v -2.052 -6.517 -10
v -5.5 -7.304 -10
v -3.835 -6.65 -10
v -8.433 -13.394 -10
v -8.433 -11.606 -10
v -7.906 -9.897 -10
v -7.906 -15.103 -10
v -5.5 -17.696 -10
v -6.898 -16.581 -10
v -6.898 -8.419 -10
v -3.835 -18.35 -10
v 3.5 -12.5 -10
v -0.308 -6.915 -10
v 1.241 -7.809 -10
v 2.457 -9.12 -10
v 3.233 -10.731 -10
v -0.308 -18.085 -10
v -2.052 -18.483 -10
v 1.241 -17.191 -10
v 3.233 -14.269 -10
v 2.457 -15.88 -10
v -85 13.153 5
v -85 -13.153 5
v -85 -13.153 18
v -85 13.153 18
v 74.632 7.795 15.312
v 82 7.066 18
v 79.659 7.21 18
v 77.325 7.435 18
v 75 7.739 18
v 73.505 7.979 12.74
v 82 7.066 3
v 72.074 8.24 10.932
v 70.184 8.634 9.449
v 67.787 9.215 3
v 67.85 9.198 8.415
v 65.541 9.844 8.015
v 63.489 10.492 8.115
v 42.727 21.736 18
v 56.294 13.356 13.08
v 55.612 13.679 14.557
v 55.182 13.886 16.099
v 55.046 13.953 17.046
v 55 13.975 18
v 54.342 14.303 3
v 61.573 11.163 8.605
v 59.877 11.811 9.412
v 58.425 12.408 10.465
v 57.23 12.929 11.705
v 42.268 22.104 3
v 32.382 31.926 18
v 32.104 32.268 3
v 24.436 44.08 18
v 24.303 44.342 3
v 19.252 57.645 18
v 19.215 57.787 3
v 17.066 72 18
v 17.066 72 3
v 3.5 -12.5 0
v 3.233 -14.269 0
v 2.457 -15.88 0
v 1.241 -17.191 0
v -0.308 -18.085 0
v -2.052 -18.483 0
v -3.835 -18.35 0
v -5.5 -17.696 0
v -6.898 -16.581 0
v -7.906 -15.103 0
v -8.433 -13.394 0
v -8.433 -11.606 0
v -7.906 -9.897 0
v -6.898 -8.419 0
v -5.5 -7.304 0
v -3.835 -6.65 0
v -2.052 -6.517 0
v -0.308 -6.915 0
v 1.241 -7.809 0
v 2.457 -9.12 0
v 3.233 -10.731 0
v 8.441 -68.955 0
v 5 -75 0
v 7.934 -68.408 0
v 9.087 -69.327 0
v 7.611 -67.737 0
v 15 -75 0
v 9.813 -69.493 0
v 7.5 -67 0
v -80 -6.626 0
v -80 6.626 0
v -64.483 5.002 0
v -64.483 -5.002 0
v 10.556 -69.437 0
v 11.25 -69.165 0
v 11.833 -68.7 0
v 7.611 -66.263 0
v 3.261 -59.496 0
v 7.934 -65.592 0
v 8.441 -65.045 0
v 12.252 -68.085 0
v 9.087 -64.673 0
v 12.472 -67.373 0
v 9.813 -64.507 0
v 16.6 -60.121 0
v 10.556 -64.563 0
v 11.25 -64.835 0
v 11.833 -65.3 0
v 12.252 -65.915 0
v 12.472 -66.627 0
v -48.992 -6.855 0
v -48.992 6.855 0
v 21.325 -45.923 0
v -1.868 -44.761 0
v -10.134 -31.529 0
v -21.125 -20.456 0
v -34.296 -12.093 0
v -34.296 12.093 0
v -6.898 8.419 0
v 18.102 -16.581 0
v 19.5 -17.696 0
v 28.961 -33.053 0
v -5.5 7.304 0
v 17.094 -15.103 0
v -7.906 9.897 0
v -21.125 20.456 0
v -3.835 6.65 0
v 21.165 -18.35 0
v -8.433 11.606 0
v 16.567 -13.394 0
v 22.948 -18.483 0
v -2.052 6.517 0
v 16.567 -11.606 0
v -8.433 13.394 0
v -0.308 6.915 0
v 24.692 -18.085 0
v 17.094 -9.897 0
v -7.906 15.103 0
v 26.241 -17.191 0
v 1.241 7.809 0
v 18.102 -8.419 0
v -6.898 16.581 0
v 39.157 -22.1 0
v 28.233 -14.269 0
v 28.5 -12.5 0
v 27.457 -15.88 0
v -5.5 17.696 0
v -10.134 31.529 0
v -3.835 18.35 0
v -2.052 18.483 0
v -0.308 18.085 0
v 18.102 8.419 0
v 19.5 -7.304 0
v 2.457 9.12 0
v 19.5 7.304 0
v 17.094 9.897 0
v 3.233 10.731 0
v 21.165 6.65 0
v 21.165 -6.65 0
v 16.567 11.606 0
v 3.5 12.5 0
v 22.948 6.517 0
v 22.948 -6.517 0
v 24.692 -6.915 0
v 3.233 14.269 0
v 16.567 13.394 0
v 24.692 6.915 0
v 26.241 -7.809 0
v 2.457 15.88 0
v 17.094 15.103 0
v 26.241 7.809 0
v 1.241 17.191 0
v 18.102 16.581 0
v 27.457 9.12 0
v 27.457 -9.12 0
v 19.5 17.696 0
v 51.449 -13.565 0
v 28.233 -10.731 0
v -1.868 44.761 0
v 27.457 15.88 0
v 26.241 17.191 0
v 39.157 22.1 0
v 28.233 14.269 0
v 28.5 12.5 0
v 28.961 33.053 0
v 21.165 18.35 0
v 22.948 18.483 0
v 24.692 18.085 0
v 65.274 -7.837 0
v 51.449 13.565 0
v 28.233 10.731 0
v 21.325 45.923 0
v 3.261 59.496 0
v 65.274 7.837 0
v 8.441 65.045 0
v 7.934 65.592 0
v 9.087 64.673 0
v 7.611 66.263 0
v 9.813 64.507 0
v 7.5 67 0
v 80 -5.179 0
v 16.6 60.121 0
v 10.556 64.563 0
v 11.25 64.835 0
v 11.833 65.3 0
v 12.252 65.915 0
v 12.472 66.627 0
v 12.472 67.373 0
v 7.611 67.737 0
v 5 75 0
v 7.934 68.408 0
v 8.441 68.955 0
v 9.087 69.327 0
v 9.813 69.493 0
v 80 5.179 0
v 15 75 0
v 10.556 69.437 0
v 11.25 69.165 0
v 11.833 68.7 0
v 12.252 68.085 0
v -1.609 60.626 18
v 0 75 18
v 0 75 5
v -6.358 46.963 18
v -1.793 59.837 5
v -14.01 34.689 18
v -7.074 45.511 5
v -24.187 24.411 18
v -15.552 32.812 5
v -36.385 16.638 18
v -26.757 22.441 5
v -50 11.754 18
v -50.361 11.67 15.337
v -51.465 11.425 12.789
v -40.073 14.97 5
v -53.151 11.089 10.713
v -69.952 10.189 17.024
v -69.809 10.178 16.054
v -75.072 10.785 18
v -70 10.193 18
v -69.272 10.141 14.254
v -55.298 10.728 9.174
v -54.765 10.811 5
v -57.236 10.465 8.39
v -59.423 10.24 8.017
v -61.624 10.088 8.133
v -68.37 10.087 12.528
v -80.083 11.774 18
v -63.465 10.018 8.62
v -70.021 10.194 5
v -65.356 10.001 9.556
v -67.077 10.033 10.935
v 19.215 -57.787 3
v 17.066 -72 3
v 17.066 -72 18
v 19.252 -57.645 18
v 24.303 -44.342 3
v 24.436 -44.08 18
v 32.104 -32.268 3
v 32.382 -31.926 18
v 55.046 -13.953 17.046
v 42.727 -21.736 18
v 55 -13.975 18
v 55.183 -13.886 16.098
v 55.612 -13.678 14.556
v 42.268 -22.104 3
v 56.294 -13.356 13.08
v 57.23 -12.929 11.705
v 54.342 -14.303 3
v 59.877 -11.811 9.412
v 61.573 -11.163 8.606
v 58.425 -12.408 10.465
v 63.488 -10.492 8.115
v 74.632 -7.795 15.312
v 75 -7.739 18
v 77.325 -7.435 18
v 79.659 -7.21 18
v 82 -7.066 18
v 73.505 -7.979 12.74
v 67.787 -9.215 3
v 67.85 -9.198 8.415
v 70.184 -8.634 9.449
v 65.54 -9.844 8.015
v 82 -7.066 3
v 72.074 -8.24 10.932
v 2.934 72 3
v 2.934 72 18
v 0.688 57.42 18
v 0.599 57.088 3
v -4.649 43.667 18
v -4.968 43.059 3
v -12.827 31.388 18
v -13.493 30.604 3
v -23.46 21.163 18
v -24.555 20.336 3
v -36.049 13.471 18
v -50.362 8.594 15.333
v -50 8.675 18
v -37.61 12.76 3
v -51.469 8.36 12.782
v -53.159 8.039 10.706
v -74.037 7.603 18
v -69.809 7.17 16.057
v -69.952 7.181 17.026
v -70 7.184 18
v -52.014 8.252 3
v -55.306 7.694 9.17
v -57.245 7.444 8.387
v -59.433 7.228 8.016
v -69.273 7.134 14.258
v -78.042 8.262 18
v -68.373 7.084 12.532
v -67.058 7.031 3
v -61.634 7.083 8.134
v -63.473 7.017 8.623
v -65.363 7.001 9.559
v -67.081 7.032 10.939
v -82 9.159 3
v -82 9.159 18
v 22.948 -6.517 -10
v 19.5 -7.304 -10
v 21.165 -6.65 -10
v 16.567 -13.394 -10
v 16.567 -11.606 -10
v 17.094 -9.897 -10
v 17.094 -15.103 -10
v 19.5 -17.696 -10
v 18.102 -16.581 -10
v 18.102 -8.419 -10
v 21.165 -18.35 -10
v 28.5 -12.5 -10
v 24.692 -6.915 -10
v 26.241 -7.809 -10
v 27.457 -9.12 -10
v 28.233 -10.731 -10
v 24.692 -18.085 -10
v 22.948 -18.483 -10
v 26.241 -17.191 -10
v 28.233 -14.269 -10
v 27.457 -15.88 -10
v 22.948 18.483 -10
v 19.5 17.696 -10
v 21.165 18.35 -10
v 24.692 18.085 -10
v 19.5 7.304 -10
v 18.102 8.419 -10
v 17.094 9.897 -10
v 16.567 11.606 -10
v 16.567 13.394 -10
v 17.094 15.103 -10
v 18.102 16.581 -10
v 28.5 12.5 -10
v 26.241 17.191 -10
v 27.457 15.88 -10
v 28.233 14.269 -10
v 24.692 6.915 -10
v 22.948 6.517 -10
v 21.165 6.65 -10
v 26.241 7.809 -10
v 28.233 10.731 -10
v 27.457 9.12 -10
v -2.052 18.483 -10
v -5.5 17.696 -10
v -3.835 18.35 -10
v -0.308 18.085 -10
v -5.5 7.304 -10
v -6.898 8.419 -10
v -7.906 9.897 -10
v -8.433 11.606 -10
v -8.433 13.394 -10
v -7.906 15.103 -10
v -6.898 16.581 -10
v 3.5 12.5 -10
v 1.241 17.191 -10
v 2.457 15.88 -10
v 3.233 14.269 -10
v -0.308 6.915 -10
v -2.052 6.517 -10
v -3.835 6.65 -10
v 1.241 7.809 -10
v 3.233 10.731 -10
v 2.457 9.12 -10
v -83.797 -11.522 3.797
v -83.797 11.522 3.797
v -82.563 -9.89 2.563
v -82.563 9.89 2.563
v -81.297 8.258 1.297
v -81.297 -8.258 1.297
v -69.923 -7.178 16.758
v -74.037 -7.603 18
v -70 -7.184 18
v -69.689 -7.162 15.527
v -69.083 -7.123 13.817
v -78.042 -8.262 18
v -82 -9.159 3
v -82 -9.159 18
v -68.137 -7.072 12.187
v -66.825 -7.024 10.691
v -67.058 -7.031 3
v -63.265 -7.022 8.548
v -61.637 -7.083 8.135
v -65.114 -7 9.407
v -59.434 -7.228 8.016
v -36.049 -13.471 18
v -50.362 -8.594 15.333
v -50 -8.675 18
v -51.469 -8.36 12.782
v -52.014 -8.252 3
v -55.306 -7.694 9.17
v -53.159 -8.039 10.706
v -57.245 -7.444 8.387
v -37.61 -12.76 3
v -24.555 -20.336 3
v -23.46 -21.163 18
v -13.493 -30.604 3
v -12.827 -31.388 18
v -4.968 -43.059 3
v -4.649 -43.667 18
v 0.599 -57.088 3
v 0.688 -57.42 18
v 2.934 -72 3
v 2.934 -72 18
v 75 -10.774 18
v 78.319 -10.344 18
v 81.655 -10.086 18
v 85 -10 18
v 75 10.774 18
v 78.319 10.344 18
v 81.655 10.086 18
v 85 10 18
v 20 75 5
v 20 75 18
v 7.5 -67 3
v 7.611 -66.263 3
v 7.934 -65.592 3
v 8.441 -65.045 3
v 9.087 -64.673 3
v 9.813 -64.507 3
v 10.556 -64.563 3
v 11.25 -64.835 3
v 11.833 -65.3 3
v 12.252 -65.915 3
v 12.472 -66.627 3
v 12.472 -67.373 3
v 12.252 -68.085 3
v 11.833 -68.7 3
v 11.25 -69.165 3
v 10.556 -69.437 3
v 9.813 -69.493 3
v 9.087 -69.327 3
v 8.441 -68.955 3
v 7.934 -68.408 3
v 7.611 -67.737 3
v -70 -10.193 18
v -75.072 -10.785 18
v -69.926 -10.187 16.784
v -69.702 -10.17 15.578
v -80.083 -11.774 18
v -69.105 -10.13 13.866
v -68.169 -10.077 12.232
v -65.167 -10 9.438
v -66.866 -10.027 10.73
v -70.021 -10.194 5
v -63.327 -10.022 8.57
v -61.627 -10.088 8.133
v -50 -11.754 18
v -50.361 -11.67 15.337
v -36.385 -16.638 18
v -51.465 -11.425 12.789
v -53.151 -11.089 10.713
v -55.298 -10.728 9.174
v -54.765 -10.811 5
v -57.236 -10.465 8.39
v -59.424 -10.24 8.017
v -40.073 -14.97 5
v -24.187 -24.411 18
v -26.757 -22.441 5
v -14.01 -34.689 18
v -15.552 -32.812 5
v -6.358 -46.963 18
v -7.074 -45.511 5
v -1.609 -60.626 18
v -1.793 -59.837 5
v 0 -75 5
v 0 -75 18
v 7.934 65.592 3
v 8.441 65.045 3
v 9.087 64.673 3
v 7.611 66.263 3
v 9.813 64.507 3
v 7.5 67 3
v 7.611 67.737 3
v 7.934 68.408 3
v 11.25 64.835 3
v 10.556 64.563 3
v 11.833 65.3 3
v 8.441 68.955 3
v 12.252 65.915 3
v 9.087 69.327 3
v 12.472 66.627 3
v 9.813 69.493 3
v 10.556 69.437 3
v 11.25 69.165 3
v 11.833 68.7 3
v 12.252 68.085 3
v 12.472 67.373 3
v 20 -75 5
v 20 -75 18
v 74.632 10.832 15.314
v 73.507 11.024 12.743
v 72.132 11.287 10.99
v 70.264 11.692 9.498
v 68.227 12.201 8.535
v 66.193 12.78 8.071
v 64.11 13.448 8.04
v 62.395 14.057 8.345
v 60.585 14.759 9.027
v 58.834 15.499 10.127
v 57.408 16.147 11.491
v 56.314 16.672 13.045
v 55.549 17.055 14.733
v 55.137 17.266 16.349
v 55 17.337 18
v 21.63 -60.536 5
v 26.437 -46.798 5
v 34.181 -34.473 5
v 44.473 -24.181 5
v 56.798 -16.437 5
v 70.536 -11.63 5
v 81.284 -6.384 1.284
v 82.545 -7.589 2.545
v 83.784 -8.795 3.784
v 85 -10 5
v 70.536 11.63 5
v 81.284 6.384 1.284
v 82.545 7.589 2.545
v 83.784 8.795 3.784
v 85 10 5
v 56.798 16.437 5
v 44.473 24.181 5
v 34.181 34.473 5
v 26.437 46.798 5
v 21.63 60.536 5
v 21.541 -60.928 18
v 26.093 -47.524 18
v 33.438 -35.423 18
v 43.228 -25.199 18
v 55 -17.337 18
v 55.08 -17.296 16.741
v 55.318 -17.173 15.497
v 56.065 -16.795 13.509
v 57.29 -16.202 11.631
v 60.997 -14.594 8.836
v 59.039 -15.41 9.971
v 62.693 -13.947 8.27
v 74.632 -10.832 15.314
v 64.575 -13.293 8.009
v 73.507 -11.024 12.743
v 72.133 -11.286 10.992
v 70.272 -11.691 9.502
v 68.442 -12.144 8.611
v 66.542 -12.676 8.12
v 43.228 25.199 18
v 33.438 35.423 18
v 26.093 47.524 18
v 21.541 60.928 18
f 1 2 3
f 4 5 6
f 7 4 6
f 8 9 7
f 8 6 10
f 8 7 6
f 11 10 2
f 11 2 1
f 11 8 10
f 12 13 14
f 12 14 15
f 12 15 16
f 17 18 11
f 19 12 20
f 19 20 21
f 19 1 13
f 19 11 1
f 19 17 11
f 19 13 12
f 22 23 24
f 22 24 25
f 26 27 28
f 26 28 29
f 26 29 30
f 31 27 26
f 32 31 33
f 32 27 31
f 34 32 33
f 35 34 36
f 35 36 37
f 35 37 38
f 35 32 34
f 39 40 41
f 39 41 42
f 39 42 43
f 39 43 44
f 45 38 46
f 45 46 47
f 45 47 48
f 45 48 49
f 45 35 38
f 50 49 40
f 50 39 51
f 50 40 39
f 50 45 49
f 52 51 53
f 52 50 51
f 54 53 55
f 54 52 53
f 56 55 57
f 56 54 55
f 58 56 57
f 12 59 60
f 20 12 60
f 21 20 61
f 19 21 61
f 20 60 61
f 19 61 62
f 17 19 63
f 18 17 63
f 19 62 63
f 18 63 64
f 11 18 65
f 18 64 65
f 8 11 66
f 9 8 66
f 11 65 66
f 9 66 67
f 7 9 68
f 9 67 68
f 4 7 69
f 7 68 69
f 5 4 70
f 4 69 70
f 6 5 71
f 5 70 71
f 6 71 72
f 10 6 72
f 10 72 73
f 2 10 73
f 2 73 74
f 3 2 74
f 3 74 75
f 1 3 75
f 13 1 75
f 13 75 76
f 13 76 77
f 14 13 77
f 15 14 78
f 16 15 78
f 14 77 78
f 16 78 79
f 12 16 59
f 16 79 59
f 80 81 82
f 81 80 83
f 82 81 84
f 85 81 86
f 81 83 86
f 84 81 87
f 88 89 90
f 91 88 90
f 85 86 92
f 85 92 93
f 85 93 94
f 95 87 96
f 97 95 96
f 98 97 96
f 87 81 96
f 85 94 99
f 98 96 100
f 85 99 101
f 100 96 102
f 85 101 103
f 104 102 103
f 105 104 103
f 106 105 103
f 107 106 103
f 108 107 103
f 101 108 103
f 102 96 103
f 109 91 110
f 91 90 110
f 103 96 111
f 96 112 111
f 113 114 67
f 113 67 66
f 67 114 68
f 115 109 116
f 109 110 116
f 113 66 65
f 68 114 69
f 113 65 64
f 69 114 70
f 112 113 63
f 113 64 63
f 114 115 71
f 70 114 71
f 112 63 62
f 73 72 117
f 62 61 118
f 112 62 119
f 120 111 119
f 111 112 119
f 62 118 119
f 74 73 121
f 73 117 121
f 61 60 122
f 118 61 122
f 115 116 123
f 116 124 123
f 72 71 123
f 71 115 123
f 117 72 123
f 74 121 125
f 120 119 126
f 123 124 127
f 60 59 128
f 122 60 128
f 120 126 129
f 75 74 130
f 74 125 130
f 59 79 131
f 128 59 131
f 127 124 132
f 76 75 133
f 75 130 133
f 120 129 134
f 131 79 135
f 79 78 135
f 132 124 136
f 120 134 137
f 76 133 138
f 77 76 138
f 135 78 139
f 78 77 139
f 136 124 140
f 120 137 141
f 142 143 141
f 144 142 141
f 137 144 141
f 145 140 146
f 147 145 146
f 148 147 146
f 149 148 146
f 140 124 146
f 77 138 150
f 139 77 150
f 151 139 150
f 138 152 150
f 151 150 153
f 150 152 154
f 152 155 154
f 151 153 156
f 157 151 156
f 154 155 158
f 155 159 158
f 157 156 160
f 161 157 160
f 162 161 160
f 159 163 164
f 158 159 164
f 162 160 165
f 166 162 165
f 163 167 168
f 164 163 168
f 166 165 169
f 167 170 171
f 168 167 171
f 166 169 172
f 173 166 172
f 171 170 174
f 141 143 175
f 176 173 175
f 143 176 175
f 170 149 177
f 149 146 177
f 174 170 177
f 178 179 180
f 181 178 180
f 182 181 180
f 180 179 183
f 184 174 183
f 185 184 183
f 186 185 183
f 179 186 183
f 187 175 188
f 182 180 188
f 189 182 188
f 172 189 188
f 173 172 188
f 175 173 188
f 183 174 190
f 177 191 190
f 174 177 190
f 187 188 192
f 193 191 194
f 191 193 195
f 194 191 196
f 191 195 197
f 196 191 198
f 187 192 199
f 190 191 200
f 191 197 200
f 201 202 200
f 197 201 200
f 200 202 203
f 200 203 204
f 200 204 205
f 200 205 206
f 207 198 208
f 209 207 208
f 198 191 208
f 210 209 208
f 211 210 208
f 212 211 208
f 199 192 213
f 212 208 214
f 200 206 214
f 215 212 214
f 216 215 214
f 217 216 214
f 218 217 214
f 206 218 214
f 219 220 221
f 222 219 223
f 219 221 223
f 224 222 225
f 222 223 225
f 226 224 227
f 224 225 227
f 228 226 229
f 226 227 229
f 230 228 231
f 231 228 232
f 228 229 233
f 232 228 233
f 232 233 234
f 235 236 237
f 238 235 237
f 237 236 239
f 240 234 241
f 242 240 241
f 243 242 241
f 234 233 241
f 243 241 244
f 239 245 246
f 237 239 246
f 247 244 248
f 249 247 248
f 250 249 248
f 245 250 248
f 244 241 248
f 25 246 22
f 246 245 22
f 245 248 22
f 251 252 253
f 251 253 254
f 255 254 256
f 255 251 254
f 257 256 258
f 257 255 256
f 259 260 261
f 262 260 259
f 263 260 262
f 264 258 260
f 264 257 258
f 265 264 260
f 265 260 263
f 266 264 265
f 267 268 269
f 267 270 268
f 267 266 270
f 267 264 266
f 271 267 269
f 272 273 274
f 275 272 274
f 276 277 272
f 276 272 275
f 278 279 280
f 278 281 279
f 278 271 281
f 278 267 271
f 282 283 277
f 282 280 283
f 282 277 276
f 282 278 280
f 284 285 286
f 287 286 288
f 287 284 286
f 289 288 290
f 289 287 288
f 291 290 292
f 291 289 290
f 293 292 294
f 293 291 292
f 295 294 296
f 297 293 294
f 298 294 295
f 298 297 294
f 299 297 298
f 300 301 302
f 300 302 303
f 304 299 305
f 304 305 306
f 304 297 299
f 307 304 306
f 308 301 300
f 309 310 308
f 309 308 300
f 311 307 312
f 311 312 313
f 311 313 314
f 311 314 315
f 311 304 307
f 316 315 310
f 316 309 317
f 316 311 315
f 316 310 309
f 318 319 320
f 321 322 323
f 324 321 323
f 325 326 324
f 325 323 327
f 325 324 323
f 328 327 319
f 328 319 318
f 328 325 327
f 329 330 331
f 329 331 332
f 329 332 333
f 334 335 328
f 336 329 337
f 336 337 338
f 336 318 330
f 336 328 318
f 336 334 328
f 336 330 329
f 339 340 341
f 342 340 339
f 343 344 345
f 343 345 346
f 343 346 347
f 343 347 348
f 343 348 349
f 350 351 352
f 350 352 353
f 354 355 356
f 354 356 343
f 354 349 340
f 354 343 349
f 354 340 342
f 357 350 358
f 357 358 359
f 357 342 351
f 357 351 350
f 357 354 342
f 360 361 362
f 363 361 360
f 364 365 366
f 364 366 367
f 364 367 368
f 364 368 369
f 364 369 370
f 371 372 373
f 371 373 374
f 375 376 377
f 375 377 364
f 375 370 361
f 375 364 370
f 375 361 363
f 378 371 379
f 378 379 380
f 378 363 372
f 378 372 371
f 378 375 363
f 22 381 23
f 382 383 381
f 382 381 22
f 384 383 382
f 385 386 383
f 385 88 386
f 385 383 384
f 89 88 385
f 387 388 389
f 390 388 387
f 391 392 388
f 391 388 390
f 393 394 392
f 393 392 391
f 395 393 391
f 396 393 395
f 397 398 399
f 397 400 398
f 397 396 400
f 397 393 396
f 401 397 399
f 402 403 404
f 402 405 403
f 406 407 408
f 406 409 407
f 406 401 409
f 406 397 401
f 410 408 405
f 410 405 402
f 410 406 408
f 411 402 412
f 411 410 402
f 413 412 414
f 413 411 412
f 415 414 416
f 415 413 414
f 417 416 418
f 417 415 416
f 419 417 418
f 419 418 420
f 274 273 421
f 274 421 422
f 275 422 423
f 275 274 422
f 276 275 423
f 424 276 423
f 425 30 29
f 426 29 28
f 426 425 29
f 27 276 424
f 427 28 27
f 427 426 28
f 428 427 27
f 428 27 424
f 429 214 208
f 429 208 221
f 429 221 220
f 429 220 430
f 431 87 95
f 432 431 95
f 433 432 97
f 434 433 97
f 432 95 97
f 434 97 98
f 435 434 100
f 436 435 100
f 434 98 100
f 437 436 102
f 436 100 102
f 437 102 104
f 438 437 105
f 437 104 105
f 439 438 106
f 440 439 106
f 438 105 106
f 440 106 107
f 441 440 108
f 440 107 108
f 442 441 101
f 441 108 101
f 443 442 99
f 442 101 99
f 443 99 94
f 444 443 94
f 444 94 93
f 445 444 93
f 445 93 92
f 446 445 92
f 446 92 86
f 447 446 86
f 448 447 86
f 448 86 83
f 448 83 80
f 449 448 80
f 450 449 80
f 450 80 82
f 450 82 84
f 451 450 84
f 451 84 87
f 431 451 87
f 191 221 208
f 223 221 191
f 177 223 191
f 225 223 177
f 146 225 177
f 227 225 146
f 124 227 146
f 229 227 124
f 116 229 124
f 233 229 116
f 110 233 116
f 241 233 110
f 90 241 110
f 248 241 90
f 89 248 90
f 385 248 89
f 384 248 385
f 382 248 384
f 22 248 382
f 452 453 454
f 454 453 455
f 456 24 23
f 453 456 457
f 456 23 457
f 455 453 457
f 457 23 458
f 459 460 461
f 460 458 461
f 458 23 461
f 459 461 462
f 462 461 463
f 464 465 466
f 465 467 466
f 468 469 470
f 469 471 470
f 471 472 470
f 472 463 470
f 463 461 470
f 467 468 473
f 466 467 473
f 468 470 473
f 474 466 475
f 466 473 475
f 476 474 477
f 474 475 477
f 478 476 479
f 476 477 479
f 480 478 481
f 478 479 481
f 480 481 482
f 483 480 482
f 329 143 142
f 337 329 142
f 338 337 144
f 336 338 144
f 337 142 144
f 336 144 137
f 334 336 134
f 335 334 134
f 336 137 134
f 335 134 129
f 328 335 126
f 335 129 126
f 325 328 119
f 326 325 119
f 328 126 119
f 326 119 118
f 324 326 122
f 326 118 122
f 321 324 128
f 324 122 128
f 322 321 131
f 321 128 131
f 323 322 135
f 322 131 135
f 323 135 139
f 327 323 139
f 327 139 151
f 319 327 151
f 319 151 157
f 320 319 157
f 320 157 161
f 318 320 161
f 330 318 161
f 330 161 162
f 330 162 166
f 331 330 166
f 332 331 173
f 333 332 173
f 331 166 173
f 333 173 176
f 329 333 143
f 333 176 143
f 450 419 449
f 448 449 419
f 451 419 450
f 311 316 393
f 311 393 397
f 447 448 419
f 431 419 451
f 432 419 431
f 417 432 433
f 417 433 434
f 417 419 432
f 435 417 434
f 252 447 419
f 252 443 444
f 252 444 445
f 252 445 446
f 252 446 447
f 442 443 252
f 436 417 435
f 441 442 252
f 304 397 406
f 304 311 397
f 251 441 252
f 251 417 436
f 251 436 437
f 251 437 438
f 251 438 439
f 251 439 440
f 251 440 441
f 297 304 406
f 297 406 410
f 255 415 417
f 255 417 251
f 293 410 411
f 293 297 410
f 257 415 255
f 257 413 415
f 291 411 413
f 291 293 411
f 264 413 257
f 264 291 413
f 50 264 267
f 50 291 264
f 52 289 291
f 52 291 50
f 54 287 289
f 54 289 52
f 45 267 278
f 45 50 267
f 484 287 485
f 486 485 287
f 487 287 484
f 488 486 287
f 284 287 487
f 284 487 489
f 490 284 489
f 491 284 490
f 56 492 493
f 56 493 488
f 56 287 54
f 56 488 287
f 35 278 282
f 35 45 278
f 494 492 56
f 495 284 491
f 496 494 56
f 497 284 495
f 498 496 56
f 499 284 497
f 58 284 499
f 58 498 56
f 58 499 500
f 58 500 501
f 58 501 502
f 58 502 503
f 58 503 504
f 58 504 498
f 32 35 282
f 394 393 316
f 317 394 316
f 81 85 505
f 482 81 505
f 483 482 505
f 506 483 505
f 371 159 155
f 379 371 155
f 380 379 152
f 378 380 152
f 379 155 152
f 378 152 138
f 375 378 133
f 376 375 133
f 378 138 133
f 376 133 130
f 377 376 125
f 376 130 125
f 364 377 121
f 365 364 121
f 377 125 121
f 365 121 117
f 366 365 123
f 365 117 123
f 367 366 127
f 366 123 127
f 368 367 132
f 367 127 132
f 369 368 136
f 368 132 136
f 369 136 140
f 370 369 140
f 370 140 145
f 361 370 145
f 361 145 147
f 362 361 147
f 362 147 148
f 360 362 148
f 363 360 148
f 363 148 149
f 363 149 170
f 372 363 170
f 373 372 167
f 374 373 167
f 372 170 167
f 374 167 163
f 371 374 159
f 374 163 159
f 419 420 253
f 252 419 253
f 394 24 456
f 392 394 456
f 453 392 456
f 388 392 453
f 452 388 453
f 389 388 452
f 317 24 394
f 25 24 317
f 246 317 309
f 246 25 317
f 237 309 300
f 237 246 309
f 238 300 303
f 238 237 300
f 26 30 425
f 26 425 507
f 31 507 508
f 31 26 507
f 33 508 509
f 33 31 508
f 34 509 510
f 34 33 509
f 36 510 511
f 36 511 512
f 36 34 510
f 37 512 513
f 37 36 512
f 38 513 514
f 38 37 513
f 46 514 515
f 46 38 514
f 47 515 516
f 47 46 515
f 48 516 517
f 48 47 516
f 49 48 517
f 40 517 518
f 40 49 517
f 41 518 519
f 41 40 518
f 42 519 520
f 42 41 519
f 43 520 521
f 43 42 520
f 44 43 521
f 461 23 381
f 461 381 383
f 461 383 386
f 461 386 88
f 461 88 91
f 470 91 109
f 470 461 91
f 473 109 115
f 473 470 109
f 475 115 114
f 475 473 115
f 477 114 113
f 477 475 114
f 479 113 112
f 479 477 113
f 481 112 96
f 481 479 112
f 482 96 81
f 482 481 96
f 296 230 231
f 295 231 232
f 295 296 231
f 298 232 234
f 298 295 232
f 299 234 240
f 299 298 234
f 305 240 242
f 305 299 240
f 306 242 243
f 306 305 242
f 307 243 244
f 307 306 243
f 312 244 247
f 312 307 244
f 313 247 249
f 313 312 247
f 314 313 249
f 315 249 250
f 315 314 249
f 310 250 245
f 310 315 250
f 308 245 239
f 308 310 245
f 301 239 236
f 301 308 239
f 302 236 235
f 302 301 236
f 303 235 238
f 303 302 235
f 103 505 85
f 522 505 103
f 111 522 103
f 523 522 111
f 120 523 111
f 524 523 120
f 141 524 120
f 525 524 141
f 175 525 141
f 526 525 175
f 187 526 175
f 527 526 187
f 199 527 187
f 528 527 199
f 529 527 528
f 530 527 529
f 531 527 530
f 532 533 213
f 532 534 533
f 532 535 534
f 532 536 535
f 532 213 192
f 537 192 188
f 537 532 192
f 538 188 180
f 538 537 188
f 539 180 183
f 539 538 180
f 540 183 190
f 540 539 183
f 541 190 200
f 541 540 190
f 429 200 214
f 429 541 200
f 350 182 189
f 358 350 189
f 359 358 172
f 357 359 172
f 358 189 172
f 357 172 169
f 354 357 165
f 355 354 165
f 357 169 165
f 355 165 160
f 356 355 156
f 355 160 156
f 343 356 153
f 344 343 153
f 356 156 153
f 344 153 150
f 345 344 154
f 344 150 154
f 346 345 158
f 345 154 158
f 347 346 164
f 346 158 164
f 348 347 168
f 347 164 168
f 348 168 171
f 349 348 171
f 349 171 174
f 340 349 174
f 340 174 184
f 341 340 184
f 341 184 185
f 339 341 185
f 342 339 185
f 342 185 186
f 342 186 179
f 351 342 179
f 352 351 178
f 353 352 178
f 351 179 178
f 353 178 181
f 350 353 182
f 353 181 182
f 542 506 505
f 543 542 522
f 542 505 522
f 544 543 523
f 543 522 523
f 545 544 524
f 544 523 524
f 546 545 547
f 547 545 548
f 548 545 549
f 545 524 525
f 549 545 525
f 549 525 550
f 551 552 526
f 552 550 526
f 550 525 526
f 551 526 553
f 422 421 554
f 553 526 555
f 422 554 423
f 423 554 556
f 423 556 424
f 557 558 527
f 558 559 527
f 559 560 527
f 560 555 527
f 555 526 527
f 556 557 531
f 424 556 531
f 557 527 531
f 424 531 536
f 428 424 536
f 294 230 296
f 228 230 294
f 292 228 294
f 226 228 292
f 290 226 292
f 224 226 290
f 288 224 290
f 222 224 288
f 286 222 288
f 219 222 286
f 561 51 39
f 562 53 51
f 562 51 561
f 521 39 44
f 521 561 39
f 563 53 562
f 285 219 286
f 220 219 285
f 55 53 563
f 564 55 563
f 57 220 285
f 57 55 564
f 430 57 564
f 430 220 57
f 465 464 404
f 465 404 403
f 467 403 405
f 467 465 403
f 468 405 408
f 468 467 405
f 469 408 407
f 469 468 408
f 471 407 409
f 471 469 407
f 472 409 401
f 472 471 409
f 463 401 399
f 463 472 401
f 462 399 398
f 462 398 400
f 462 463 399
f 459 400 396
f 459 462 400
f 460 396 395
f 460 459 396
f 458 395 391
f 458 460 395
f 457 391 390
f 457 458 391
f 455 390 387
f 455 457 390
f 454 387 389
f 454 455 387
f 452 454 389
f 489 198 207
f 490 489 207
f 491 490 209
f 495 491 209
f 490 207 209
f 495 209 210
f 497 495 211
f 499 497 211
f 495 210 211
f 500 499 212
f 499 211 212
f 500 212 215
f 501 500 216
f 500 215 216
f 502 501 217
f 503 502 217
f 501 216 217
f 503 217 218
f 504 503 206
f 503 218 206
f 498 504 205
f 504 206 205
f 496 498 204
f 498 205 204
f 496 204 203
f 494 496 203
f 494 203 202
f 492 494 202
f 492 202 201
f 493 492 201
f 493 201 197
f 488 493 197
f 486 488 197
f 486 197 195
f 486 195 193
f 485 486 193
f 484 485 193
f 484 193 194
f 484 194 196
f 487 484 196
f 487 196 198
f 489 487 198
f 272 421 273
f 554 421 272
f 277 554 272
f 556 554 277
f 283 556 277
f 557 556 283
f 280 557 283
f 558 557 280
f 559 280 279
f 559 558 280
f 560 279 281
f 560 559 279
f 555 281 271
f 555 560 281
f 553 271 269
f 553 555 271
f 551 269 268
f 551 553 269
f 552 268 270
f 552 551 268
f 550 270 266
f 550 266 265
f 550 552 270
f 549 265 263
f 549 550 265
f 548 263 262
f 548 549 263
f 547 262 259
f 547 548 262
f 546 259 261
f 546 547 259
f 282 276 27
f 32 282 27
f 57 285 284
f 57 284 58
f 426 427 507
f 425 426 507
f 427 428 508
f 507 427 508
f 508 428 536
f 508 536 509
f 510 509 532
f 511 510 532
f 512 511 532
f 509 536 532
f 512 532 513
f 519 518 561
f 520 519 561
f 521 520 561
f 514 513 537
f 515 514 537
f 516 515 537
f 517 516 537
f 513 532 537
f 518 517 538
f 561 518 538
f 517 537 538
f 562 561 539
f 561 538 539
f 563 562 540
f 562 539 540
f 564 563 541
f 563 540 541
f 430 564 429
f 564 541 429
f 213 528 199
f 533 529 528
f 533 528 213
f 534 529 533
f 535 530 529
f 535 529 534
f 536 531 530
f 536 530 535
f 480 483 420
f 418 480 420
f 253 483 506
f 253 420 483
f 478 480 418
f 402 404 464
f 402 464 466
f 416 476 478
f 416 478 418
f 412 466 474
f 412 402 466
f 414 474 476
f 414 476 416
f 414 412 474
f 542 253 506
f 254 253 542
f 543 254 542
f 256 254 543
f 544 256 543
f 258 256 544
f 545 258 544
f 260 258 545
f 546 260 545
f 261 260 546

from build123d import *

# Parameters (mm, degrees)
SKETCH1_W               = 170
SKETCH1_H               = 150
BOSS_EXTRUDE1_DEPTH     = 18
SKETCH2_R               = 65
CUT_EXTRUDE1_DEPTH      = 20
SHELL2_T                = -3
CUT_EXTRUDE2_DEPTH      = 20
CUT_EXTRUDE2_DEPTH_BACK = 20
SKETCH3_R               = 10
SKETCH4_R               = 2.5
CUT_EXTRUDE3_DEPTH      = 20
CHAMFER1_SIZE           = 5
SKETCH5_R               = 6
BOSS_EXTRUDE2_DEPTH     = 10


with BuildPart() as part:
    # Sketch1 → Boss-Extrude1 (new body)
    with BuildSketch(Plane.XY):
        Rectangle(SKETCH1_W, SKETCH1_H)
    extrude(amount=BOSS_EXTRUDE1_DEPTH)

    # Sketch2 → Cut-Extrude1 (cut)
    with BuildSketch(Plane(origin=(0, 0, 0), x_dir=(-1, 0, 0), z_dir=(0, 0, -1))):
        with Locations((-85, 75)):
            Circle(SKETCH2_R)
        with Locations((-85, -75)):
            Circle(SKETCH2_R)
        with Locations((65, 75)):
            Circle(SKETCH2_R)
        with Locations((65, -75)):
            Circle(SKETCH2_R)
    extrude(amount=-CUT_EXTRUDE1_DEPTH, mode=Mode.SUBTRACT)

    # Shell2
    shell2_openings = [part.faces().sort_by_distance(p)[0] for p in [
        (6.095773298, 0, 18),
    ]]
    offset(amount=SHELL2_T, openings=shell2_openings, kind=Kind.INTERSECTION)

    # Sketch3 → Cut-Extrude2 (cut, two sides: drawn at the far end of the back side and taken through both)
    with BuildSketch(Plane(origin=(0, 0, 0), x_dir=(1, 0, 0), z_dir=(0, 1, 0)).offset(-CUT_EXTRUDE2_DEPTH_BACK)):
        with Locations((-60, -18)):
            Circle(SKETCH3_R)
        with Locations((65, -18)):
            Circle(SKETCH3_R)
    extrude(amount=CUT_EXTRUDE2_DEPTH + CUT_EXTRUDE2_DEPTH_BACK, mode=Mode.SUBTRACT)

    # Sketch4 → Cut-Extrude3 (cut)
    with BuildSketch(Plane(origin=(0, 0, 0), x_dir=(-1, 0, 0), z_dir=(0, 0, -1))):
        with Locations((-10, -67)):
            Circle(SKETCH4_R)
        with Locations((-10, 67)):
            Circle(SKETCH4_R)
    extrude(amount=-CUT_EXTRUDE3_DEPTH, mode=Mode.SUBTRACT)

    # Chamfer1
    chamfer1_edges = [part.edges().sort_by_distance(p)[0] for p in [
        (-85, 0, 0),
        (85, 0, 0),
        (39.038059223, 29.038059223, 0),
        (39.038059223, -29.038059223, 0),
        (-26.757353648, 22.440509896, 0),
        (-26.757353648, -22.440509896, 0),
    ]]
    chamfer(chamfer1_edges, length=CHAMFER1_SIZE)

    # Sketch5 → Boss-Extrude2 (add)
    with BuildSketch(Plane(origin=(0, 0, 0), x_dir=(-1, 0, 0), z_dir=(0, 0, -1))):
        with Locations(Location((-22.5, 12.5, 0), (0, 0, 180))):
            Circle(SKETCH5_R)
        with Locations(Location((2.5, 12.5, 0), (0, 0, 180))):
            Circle(SKETCH5_R)
        with Locations(Location((2.5, -12.5, 0), (0, 0, 180))):
            Circle(SKETCH5_R)
        with Locations(Location((-22.5, -12.5, 0), (0, 0, 180))):
            Circle(SKETCH5_R)
    extrude(amount=BOSS_EXTRUDE2_DEPTH)


solid = part.part
